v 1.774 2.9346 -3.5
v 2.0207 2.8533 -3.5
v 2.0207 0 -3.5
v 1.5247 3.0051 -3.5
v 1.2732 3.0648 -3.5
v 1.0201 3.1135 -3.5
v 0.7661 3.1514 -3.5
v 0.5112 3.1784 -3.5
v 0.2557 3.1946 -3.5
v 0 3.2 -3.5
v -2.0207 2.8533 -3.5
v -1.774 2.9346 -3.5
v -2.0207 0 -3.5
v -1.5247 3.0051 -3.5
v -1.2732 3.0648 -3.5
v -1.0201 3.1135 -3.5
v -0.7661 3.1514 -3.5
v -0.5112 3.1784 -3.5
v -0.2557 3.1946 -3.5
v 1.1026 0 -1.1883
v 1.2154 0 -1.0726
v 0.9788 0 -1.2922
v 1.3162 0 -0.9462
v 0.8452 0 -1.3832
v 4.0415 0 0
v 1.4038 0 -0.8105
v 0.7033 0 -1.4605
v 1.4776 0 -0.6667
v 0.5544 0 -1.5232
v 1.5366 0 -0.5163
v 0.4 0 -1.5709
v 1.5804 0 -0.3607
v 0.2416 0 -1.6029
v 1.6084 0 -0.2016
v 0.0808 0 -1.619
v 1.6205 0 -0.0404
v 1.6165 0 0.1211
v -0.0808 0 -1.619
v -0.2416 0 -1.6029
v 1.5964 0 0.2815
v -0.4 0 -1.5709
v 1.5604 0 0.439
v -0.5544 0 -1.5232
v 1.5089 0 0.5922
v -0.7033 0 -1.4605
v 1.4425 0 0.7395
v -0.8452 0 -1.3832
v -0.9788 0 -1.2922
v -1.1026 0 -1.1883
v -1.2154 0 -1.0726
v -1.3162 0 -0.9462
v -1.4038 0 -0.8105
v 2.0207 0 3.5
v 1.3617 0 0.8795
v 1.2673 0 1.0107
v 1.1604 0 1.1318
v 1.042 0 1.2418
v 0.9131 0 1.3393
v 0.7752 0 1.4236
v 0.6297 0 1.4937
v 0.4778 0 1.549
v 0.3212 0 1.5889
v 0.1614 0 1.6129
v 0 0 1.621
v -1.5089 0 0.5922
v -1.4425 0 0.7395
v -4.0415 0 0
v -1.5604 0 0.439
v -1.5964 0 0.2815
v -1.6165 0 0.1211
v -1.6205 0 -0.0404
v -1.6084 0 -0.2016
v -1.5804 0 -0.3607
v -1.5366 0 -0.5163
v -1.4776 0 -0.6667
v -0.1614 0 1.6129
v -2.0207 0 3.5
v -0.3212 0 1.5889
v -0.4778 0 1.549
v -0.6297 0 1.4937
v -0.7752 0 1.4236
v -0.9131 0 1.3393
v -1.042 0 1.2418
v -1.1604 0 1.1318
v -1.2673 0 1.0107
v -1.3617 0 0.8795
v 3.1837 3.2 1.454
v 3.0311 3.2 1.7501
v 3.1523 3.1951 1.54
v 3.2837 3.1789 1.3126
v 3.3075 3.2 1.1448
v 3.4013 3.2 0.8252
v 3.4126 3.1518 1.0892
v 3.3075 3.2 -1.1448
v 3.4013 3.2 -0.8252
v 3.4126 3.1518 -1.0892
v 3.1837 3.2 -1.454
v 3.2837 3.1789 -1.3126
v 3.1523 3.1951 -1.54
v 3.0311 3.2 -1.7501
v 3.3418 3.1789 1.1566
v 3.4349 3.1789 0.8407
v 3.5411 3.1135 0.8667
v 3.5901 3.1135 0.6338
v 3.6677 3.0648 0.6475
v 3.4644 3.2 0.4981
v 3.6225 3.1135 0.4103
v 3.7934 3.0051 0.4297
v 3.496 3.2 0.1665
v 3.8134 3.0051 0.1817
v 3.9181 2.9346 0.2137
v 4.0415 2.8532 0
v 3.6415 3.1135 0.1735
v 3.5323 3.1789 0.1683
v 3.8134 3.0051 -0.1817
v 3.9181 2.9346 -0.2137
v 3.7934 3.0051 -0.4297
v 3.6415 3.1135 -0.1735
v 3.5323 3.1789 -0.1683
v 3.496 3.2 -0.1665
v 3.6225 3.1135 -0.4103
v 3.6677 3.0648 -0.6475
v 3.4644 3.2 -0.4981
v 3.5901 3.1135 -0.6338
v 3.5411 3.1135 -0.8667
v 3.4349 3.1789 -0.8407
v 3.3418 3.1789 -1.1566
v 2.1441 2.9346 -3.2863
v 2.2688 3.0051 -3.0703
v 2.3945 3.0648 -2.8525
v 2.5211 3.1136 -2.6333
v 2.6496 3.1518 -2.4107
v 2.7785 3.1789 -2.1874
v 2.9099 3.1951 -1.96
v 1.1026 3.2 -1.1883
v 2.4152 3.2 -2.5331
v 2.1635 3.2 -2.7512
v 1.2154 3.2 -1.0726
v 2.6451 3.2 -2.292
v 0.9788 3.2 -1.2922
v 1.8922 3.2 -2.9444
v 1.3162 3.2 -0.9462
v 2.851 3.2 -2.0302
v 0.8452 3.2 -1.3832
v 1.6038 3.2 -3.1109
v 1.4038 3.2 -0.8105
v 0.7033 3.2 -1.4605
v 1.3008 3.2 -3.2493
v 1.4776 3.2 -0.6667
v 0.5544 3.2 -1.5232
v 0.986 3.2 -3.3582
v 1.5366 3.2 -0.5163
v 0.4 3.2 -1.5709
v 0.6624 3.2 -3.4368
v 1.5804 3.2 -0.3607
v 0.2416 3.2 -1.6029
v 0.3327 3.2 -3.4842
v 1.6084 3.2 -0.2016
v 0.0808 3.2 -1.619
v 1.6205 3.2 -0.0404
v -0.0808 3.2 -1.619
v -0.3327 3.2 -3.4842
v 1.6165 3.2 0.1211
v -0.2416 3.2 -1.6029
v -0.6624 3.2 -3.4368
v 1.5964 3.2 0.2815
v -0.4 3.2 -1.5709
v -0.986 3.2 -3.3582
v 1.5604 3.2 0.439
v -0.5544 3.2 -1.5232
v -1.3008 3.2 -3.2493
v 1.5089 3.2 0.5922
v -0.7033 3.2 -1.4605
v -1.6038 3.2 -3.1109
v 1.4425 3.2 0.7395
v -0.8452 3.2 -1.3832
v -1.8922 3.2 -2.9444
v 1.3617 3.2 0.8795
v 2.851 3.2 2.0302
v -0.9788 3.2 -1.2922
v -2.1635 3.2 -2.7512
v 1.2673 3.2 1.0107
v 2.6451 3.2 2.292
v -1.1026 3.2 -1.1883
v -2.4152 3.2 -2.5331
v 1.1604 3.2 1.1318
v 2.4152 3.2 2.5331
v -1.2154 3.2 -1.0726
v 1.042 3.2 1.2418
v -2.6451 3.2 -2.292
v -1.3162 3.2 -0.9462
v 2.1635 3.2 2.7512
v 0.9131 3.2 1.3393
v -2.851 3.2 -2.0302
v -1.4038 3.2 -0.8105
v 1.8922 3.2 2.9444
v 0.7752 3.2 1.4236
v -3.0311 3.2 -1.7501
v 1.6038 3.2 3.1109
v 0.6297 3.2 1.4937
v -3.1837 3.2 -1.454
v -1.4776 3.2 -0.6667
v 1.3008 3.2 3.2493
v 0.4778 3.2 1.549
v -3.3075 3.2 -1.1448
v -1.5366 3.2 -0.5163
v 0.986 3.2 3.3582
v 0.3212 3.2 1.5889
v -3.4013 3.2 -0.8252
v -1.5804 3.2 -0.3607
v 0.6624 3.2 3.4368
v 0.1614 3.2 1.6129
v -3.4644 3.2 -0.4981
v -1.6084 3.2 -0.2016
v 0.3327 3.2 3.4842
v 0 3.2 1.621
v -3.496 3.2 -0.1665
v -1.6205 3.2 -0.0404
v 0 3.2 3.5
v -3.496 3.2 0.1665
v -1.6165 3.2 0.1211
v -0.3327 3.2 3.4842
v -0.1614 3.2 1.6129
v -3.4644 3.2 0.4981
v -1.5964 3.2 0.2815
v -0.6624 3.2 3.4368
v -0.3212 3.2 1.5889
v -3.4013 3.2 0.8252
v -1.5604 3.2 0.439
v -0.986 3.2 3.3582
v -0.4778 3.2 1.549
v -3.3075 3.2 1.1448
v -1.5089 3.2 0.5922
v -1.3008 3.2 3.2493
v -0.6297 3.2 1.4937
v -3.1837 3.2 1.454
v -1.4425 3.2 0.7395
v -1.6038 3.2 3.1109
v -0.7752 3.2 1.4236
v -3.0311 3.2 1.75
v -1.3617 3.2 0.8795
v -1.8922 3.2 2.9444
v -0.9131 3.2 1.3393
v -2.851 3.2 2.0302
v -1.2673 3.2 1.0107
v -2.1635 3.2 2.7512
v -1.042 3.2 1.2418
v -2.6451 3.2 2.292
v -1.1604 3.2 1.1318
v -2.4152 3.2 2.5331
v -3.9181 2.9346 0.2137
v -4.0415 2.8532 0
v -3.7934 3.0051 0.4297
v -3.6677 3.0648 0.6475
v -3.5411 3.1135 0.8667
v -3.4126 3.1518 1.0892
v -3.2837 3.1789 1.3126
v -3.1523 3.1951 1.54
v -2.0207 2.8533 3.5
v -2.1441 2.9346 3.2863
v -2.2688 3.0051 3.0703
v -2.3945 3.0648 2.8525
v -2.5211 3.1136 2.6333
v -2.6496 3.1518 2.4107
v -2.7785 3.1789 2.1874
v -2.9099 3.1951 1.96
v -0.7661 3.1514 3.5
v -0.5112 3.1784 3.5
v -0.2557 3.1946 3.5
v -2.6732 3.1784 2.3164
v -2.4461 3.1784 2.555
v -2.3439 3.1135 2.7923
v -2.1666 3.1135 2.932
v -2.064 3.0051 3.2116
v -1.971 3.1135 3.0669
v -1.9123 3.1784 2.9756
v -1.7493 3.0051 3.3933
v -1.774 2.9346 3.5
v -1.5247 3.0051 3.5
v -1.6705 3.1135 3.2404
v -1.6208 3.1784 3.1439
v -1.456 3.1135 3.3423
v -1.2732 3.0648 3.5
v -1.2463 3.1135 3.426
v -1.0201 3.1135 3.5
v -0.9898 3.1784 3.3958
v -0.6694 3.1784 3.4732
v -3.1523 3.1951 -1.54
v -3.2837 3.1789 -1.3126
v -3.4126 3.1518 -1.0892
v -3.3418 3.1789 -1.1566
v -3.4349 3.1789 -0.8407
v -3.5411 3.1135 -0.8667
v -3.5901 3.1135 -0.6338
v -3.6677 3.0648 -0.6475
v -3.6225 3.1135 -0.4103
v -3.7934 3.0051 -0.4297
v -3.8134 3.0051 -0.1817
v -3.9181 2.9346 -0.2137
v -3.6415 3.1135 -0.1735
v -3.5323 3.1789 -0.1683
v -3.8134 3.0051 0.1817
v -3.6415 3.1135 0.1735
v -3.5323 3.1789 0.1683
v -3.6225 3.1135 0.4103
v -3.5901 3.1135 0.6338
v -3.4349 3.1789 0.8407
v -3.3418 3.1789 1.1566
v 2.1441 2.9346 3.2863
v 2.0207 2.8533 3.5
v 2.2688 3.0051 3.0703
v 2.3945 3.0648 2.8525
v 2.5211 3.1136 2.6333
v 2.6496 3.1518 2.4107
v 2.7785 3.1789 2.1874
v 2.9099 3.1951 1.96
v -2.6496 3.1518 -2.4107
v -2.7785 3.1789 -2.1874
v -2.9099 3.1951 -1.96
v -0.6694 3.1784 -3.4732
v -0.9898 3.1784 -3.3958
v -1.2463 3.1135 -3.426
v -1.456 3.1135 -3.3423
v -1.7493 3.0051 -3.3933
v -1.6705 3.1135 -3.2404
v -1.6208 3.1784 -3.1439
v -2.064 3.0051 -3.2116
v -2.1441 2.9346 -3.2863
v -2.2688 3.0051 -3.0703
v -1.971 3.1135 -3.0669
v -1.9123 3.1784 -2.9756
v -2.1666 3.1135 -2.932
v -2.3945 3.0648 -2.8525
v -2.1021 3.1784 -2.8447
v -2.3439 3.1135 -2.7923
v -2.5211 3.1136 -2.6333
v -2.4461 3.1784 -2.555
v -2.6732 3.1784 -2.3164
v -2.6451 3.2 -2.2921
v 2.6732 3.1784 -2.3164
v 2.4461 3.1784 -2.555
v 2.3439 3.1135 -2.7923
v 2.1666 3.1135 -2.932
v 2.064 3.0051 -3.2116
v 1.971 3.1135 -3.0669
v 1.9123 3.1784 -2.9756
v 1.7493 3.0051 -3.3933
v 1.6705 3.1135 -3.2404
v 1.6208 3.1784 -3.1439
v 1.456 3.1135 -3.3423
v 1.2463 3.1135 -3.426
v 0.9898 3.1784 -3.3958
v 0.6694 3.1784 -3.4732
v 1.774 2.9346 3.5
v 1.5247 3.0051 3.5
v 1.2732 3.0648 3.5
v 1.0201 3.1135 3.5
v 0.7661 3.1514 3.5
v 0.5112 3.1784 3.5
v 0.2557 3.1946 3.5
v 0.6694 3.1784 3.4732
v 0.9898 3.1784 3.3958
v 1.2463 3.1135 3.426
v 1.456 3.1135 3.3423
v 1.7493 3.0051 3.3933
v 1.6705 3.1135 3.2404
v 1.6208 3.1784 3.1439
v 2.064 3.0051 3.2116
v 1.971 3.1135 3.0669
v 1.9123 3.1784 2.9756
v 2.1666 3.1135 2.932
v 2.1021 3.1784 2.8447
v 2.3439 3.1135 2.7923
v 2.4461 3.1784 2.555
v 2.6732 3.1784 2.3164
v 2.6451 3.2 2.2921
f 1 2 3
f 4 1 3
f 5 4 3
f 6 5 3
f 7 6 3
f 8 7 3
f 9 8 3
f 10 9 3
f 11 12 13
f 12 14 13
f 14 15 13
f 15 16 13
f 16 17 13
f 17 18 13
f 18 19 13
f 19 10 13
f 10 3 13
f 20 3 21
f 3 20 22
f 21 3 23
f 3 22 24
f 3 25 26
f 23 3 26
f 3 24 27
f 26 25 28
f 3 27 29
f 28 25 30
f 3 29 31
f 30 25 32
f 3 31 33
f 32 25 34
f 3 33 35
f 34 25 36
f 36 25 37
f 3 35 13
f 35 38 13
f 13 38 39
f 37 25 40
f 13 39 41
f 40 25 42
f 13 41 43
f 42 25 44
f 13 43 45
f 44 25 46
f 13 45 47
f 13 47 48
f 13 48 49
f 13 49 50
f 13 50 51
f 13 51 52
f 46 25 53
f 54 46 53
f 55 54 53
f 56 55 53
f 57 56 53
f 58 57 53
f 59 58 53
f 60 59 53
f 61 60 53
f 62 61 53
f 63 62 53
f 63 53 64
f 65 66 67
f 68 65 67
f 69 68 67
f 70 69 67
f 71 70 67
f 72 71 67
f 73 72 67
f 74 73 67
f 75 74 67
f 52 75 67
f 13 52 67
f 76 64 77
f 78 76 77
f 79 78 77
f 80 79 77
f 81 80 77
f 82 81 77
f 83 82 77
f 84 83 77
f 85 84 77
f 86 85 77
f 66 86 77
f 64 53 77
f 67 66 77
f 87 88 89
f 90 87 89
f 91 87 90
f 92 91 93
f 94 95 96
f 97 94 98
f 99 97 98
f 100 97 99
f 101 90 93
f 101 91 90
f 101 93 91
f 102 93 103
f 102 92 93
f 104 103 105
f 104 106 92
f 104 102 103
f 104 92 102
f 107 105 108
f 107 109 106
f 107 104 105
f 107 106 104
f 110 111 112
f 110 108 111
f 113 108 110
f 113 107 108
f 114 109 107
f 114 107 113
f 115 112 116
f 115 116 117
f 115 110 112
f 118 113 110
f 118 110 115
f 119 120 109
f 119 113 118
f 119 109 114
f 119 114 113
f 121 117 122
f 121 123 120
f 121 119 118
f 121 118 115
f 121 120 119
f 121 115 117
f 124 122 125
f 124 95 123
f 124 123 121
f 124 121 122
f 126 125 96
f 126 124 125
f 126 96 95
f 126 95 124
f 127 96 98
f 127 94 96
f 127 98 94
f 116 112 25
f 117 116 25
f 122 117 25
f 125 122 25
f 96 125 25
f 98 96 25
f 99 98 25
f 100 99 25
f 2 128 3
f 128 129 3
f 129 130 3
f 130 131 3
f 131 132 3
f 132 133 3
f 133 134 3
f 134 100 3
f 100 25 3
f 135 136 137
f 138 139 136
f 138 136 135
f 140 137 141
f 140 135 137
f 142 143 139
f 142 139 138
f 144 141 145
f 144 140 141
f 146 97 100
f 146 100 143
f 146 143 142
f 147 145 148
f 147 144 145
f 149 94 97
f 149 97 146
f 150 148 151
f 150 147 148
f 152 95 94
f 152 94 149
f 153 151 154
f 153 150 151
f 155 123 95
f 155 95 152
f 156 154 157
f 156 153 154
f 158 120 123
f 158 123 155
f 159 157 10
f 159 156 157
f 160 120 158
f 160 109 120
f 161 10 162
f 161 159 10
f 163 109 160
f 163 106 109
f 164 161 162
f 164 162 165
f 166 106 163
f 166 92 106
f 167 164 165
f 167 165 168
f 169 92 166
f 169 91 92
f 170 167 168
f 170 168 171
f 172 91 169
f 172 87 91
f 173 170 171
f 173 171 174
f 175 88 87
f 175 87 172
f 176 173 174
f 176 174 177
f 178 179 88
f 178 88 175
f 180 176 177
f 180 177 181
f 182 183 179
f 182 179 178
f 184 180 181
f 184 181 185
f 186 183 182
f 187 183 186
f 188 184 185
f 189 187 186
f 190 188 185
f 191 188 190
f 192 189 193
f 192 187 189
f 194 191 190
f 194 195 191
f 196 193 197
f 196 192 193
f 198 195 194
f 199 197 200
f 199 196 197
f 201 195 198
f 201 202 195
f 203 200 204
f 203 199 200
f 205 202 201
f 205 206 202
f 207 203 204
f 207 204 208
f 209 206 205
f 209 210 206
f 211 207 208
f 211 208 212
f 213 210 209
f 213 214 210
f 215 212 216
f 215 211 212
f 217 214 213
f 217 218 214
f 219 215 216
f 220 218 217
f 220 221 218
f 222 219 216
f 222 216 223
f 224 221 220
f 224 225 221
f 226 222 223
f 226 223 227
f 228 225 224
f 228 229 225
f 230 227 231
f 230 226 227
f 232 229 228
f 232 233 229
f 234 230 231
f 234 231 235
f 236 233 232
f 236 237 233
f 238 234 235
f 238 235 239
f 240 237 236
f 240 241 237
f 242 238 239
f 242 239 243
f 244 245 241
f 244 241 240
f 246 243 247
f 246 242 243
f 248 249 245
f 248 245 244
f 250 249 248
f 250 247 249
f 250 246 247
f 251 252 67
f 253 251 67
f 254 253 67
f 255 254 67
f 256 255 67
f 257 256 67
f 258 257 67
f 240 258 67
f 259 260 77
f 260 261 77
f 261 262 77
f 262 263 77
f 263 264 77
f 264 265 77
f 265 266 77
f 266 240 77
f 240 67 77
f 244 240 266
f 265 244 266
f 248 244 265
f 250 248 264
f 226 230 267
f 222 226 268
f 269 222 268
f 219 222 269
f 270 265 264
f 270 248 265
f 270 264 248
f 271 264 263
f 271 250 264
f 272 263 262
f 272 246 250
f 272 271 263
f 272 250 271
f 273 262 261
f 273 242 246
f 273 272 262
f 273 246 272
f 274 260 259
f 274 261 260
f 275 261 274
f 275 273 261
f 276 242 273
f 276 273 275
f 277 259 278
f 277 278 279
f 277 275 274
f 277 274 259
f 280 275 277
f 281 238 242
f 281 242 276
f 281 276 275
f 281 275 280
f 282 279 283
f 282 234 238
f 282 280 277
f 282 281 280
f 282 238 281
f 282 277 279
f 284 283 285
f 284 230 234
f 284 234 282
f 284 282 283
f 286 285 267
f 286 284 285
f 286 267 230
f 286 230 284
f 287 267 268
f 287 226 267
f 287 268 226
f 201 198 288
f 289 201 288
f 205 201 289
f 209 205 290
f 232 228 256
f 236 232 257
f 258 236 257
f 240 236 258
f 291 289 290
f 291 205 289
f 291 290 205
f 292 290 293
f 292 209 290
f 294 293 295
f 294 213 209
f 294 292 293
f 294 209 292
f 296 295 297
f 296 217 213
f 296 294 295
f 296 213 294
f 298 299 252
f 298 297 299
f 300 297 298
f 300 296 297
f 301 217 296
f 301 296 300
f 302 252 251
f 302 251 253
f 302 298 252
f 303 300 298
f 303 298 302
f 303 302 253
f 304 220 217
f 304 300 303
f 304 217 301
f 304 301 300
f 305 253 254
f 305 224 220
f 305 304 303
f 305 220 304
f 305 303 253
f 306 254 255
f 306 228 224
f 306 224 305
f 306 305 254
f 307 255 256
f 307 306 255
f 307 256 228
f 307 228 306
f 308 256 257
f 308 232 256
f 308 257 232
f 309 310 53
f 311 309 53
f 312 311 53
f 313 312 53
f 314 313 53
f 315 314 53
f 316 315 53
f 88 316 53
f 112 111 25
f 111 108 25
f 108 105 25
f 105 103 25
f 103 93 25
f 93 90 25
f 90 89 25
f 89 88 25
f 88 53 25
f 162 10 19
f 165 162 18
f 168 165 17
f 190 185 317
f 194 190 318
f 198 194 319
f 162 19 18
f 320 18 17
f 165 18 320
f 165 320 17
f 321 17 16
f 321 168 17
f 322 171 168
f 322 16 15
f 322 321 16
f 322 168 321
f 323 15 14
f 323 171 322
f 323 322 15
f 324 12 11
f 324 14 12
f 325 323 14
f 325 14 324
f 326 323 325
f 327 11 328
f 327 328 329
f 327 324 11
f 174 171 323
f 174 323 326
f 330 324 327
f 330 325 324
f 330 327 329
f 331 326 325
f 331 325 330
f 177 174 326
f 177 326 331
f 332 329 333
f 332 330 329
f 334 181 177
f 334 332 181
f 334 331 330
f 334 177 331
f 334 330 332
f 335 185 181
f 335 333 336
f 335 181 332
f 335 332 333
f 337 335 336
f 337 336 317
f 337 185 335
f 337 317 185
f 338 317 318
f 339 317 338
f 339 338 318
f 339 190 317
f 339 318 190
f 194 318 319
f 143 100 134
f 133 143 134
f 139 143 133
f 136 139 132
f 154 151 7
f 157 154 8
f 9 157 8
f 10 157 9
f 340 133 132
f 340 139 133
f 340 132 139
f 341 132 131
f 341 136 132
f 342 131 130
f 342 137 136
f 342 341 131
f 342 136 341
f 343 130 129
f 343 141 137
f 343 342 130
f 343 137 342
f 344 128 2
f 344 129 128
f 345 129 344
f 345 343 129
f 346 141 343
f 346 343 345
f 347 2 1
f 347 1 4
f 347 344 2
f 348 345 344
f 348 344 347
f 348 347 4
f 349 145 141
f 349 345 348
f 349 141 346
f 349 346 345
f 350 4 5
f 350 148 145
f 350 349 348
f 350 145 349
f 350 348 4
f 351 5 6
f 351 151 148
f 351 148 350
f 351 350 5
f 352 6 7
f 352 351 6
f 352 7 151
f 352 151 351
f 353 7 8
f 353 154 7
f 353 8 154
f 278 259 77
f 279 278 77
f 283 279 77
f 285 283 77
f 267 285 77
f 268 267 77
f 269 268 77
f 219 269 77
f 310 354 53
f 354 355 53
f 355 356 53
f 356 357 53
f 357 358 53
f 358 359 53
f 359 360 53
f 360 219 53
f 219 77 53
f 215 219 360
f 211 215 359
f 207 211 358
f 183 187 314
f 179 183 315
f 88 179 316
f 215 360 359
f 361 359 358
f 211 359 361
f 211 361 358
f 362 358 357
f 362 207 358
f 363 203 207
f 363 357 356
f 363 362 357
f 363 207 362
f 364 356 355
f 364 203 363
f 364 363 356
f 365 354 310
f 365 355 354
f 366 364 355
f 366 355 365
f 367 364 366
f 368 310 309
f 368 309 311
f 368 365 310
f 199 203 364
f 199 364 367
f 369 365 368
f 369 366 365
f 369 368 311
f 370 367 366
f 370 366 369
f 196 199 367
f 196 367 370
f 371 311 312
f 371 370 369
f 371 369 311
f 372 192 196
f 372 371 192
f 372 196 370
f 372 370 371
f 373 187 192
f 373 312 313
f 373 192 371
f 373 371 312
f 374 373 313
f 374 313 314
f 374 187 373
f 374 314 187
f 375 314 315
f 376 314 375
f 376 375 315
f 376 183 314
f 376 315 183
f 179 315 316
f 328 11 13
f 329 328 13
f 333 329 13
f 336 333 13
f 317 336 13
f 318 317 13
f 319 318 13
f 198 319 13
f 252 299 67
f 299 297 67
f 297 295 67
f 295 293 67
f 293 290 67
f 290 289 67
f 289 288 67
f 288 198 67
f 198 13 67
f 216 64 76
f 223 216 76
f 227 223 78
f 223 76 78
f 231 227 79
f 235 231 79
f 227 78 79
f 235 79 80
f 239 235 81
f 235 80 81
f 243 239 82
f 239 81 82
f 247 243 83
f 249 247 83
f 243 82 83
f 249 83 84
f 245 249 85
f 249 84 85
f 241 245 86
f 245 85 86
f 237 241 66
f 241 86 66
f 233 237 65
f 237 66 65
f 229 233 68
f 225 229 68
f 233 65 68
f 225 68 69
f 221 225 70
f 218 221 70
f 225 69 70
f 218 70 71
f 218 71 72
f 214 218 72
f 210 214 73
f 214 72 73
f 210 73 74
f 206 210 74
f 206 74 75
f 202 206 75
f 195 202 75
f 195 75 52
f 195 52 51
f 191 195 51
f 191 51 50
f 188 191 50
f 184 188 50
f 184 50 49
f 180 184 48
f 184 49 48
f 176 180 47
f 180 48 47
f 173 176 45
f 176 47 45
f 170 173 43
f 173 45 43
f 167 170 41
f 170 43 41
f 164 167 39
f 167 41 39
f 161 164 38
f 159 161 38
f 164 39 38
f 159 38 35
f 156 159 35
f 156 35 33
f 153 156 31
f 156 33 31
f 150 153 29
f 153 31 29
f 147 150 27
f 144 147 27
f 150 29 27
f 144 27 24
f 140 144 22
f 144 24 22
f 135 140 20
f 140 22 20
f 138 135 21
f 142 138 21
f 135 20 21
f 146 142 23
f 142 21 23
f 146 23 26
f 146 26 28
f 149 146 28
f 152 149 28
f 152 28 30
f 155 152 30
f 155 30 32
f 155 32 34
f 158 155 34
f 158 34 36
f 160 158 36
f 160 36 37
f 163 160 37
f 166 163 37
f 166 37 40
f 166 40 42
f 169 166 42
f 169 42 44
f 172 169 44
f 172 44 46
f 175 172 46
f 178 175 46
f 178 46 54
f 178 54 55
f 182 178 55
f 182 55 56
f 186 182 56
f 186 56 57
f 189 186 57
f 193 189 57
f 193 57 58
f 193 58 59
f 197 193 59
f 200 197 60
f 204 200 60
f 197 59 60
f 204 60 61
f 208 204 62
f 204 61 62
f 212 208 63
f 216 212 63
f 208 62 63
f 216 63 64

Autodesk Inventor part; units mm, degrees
ref_plane "YZ Plane" through (0, 0, 0) normal (1, 0, 0) x (0, 1, 0)
ref_plane "XZ Plane" through (0, 0, 0) normal (0, 1, 0) x (-1, 0, 0)
ref_plane "XY Plane" through (0, 0, 0) normal (0, 0, 1) x (1, 0, 0)
sketch "スケッチ1" plane through (0, 0, 0) normal (0, 1, 0) x (-1, 0, 0)
  circle A0 centre (0, 0) radius 4.0415 construction
  line L0 (4.0415, 0) -> (2.0207, 3.5)
  line L1 (2.0207, 3.5) -> (-2.0207, 3.5)
  line L2 (-2.0207, 3.5) -> (-4.0415, 0)
  line L3 (-4.0415, 0) -> (-2.0207, -3.5)
  line L4 (-2.0207, -3.5) -> (2.0207, -3.5)
  line L5 (2.0207, -3.5) -> (4.0415, 0)
  dimension "d0" = 7
extrude "押し出し1" add sketch "スケッチ1" along normal blind 3.2
sketch "スケッチ2" plane through (0, 3.2, 0) normal (0, 1, 0) x (1, 0, 0)
  point P0 (0, 0)
  point P1 (0, 0)
hole "穴1" at (0, 3.2, 0) direction (0, -1, 0) diameter 3.242 end through all thread size "M4x0.7" class "6H" standard "ISO Metric profile"
sketch "スケッチ3" plane through (0, 0, 0) normal (1, 0, 0) x (0, 1, 0)
  arc A0 (2.4997, -4.5) -> (3.2, -3.5) centre (-2.8622, 0) ccw
  line L0 (0, -3.5) -> (3.2, -3.5) construction
  line L1 (3.2, -4.5) -> (2.4997, -4.5)
  line L2 (3.2, 1.621) -> (3.2, -1.621) construction
  line L3 (3.2, -3.5) -> (3.2, -4.5)
  line L4 (-3.9049, 0) -> (2.5514, 0) projected
  point P0 (0, 0)
  point P1 (3.2, 0)
  dimension "d10" = 3.5
  dimension "d11" = 7
  dimension "d12" = 1
revolve "回転1" cut sketch "スケッチ3" angle 360 about axis through (0, -10, 0) along (0, 1, 0)
properties part number "M3-HexaNut-type2"
